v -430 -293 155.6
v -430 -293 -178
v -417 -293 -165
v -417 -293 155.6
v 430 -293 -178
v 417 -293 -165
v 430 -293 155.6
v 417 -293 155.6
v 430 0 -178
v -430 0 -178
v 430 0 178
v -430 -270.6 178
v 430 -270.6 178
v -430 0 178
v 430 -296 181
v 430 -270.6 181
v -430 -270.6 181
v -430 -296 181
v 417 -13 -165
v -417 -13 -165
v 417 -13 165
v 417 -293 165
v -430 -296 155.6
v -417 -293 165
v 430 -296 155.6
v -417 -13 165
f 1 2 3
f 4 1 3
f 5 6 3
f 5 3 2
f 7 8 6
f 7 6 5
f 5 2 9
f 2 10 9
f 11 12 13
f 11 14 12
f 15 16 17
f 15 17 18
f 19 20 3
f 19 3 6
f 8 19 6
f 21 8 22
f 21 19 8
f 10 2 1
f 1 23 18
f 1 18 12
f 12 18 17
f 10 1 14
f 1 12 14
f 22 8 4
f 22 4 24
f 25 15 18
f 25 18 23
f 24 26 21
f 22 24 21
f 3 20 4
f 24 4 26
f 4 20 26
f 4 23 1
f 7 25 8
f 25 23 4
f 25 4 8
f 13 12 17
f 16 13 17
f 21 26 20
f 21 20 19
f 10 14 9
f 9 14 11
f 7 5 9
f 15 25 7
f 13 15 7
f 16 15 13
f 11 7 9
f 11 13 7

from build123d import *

# Parameters (mm, degrees)
F0_W     = 860
F0_H     = 356
F1_DEPTH = 13
F2_W     = 13
F2_H     = 356
F3_DEPTH = 280
F4_W     = 834
F4_H     = 13
F5_DEPTH = 280
F7_DEPTH = 860


with BuildPart() as f1:
    # F0 (on Front) → F1 (new body)
    with BuildSketch(Plane.XZ):
        Rectangle(F0_W, F0_H)
    extrude(amount=F1_DEPTH)

    # F2 (on face) → F3 (join)
    with BuildSketch(Plane.XZ.offset(13)):
        with Locations((-423.5, 0)):
            Rectangle(F2_W, F2_H)
        with Locations((423.5, 0)):
            Rectangle(F2_W, F2_H)
    extrude(amount=F3_DEPTH)

    # F4 (on face) → F5 (join)
    with BuildSketch(Plane.XZ.offset(13)):
        with Locations((0, 171.5)):
            Rectangle(F4_W, F4_H)
        with Locations((0, -171.5)):
            Rectangle(F4_W, F4_H)
    extrude(amount=F5_DEPTH)

    # F6 (on face) → F7 (join, through all)
    with BuildSketch(Plane.YZ.offset(430)):
        Polygon((-270.6, 178), (-270.6, 181), (-296, 181), (-296, 155.6), (-293, 155.6), (-293, 178), align=None)
    extrude(amount=-F7_DEPTH)


solid = f1.part
